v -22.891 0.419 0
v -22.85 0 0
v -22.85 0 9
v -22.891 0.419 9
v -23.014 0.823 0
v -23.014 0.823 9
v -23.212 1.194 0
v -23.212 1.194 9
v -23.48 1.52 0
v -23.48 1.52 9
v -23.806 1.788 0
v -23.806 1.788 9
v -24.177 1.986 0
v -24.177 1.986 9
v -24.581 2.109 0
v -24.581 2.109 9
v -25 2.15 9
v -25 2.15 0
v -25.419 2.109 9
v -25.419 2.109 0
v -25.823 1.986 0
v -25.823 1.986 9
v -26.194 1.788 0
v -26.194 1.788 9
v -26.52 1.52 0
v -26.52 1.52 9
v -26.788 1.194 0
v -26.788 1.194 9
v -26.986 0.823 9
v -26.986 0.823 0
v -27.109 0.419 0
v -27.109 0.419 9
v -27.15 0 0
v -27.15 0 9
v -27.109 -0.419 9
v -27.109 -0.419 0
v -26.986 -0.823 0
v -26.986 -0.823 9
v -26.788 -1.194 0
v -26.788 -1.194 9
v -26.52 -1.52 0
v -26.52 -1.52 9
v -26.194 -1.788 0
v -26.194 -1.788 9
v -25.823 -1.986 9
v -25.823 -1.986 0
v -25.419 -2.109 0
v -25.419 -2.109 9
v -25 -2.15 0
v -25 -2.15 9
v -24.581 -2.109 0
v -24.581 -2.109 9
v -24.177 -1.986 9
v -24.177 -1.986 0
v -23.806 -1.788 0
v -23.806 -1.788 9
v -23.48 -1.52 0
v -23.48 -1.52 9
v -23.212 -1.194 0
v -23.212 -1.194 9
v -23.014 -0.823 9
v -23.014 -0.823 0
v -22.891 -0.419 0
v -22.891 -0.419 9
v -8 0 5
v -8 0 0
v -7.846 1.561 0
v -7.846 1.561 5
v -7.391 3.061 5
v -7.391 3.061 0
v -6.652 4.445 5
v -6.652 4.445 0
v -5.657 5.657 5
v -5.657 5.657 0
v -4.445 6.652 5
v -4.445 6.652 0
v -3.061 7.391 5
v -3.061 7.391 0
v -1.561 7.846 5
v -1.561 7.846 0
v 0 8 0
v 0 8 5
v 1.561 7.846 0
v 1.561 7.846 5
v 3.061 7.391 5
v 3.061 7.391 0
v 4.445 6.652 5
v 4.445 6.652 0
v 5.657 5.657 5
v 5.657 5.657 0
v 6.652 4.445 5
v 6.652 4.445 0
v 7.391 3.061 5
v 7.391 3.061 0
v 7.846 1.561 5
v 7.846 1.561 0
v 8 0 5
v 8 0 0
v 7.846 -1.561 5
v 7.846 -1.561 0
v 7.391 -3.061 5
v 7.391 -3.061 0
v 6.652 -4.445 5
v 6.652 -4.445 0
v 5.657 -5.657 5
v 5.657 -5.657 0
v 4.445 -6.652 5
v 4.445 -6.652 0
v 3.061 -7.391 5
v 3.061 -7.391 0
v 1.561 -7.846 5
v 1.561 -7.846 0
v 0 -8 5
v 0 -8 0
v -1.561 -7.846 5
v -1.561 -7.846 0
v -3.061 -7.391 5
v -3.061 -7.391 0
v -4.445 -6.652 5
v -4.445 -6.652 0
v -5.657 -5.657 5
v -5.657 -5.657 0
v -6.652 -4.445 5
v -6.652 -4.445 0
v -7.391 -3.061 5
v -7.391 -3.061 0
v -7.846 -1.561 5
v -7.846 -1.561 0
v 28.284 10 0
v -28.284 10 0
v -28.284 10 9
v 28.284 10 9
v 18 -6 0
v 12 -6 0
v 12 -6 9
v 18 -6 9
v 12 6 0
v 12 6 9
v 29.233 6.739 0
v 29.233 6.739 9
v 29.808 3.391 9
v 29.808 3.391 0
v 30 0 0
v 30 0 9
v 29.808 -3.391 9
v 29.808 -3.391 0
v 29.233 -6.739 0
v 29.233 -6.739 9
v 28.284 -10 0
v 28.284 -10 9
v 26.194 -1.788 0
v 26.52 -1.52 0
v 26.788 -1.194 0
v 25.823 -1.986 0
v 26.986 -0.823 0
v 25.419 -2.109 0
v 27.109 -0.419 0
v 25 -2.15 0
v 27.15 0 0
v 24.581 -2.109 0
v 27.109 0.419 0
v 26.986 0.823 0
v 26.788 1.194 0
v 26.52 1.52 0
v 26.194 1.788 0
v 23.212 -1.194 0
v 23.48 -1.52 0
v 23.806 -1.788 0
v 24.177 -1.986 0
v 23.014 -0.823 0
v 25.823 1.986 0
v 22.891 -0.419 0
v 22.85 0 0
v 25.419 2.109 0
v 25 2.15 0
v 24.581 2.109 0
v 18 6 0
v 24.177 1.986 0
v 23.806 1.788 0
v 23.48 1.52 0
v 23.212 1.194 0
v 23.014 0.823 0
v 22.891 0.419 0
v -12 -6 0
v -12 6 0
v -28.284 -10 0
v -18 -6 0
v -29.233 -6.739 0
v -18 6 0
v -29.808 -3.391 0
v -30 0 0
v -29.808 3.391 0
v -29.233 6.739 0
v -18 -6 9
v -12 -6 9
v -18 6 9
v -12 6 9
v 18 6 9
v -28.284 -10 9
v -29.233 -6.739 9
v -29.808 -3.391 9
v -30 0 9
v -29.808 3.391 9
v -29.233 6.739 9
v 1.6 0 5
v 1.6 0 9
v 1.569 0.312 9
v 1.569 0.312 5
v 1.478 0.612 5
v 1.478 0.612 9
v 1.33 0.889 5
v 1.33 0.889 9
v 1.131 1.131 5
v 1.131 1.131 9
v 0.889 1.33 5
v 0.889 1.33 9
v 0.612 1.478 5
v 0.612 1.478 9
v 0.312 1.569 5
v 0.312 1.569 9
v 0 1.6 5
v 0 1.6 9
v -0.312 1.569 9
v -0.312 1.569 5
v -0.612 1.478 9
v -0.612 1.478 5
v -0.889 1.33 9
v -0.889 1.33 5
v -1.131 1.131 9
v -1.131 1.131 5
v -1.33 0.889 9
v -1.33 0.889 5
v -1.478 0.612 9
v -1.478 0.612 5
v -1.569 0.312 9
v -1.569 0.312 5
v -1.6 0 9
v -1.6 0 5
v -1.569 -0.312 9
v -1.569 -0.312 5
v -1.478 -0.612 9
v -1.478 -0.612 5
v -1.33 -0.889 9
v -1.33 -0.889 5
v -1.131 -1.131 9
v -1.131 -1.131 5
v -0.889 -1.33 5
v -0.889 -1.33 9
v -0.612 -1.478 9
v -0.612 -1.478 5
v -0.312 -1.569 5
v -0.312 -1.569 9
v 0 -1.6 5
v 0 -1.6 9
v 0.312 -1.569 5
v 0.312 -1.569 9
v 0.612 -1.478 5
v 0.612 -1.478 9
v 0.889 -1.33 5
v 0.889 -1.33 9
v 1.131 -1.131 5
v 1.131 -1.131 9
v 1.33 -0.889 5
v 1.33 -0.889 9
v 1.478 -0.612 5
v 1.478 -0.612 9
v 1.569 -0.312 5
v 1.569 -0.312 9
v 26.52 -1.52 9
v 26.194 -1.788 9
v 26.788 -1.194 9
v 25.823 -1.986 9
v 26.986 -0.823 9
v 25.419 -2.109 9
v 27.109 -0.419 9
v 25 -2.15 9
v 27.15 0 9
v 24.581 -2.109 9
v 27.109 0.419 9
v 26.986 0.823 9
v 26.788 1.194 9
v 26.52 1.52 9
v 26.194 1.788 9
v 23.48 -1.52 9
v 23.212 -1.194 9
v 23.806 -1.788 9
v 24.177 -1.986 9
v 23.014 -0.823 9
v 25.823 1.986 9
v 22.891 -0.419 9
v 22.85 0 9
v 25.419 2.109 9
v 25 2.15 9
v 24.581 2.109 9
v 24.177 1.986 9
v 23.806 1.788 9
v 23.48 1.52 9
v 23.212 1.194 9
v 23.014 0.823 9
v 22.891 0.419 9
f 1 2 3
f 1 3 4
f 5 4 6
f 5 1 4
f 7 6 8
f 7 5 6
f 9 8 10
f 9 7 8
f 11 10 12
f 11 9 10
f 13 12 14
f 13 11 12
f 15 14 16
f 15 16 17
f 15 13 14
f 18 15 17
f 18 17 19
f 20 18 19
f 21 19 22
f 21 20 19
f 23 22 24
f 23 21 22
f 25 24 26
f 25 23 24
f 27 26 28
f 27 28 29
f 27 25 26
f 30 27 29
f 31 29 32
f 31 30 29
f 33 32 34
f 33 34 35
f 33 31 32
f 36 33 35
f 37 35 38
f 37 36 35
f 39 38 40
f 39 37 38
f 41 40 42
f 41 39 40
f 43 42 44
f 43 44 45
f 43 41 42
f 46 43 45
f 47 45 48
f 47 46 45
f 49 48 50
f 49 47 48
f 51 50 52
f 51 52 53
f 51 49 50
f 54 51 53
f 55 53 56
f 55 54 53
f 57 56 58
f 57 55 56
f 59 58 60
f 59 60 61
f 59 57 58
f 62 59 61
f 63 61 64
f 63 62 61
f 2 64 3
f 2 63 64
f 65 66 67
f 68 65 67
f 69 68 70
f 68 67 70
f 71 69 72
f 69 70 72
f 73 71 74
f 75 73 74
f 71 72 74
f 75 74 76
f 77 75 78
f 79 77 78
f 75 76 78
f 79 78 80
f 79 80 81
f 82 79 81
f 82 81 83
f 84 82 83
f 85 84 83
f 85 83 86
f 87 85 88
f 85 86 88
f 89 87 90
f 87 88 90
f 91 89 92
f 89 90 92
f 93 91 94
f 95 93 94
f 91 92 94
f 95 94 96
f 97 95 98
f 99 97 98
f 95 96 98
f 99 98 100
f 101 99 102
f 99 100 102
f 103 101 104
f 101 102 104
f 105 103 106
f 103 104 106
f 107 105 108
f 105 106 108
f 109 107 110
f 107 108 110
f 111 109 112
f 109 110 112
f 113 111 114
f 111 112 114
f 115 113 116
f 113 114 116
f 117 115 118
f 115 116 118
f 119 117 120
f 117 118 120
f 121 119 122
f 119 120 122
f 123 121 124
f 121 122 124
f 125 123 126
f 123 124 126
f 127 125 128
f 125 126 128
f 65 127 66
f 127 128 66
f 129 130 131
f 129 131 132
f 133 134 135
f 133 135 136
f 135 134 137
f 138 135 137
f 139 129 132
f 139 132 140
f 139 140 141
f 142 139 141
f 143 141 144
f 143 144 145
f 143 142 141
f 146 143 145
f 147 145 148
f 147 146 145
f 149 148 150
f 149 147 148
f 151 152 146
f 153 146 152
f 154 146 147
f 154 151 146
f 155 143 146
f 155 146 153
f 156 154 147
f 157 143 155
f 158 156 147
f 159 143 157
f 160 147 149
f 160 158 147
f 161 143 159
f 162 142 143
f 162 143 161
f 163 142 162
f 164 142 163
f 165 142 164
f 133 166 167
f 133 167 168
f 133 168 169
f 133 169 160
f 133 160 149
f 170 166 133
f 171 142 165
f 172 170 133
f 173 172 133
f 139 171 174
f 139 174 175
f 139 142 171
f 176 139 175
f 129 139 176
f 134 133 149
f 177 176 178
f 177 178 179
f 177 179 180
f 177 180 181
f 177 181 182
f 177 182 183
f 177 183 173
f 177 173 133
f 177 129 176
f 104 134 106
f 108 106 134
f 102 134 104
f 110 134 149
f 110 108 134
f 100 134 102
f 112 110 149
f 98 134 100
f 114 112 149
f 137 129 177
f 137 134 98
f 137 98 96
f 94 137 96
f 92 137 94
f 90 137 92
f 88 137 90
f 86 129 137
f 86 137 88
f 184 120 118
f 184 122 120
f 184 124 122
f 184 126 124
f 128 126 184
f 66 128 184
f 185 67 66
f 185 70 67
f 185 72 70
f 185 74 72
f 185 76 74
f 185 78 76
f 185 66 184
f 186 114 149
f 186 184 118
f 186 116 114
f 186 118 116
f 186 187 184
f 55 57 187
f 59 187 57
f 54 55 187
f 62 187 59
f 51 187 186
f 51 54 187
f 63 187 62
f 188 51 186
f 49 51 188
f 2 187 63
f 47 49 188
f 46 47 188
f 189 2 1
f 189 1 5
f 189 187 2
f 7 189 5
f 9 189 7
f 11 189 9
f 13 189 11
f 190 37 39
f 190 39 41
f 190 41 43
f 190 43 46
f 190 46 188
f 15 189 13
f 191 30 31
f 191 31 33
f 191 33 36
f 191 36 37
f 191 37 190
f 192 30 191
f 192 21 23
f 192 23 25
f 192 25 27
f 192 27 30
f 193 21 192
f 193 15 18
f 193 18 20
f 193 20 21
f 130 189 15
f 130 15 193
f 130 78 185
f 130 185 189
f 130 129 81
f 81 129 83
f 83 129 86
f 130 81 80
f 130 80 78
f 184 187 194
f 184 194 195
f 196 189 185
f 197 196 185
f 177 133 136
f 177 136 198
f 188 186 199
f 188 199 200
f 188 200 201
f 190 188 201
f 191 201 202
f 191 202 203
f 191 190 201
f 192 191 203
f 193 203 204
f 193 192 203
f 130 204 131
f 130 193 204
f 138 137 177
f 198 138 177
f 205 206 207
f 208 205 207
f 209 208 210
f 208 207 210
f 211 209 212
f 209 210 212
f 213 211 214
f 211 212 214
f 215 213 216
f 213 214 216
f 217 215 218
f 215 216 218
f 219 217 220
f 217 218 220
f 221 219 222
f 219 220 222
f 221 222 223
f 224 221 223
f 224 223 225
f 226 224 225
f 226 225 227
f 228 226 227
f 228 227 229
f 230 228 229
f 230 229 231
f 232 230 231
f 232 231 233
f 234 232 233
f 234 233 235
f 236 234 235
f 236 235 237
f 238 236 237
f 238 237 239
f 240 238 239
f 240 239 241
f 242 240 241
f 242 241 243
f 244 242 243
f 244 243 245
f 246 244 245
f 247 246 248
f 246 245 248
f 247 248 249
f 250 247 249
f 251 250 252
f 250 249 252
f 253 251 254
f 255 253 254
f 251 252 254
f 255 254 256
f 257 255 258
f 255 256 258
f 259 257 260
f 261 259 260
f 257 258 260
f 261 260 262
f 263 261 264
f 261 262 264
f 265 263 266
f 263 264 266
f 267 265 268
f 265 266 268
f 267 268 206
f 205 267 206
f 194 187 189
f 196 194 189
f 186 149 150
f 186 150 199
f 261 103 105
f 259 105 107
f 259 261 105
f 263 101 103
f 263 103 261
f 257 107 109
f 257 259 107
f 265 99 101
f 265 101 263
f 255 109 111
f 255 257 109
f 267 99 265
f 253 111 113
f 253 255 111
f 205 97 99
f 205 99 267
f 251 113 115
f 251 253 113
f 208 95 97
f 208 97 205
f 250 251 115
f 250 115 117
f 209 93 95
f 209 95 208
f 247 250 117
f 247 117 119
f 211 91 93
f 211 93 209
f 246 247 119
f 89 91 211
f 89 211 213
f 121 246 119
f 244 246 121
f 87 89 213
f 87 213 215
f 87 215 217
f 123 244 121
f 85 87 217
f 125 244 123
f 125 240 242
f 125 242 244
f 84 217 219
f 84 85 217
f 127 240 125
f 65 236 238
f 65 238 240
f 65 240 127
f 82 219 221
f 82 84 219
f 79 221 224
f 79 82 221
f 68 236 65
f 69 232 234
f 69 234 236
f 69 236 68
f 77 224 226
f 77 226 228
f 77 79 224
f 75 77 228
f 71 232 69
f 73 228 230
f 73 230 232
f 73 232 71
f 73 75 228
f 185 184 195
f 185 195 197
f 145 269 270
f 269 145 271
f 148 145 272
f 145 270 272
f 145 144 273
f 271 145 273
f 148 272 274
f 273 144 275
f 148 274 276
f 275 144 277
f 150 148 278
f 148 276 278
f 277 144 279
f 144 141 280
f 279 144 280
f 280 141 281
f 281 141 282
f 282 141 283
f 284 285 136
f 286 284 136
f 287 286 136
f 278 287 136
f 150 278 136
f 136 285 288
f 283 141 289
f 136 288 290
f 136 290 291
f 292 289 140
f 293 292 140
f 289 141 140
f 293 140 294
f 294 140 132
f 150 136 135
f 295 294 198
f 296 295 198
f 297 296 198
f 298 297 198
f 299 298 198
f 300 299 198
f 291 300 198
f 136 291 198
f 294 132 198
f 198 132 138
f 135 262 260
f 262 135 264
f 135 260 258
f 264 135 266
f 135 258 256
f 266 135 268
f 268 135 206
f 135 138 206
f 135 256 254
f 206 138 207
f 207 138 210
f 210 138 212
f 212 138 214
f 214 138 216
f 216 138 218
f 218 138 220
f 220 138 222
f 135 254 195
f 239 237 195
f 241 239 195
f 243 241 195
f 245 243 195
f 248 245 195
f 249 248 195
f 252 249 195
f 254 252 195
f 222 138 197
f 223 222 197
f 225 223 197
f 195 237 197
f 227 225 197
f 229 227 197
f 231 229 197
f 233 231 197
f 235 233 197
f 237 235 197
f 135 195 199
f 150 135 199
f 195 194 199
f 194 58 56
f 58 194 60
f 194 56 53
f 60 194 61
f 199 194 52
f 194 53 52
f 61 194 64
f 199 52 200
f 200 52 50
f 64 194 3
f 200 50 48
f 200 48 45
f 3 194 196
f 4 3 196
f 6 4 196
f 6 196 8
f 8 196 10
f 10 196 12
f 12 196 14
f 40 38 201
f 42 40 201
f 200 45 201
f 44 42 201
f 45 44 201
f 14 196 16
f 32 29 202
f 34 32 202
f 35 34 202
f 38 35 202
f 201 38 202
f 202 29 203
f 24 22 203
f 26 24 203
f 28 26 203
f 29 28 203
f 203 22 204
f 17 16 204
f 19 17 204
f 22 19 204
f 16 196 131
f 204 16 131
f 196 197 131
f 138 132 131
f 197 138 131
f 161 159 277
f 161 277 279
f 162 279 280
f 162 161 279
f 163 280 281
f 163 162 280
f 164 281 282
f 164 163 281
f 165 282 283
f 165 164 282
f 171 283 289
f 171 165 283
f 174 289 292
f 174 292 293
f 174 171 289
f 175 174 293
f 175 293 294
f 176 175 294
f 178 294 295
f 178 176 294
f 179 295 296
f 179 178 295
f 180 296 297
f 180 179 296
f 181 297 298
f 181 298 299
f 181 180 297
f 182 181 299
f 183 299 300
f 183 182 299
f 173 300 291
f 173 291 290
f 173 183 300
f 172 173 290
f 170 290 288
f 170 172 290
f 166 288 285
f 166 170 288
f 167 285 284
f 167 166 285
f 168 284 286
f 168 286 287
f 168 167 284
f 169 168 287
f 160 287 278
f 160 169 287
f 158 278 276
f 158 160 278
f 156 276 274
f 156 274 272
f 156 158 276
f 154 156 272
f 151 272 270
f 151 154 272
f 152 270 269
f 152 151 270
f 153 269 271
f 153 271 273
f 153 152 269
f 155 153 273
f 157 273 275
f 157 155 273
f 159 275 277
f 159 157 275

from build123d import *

# Parameters (mm, degrees)
ESQUISSE1_R             = 2.15
ESQUISSE1_W             = 6
ESQUISSE1_H             = 12
BOSS_EXTRU_1_DEPTH      = 9
ESQUISSE2_R             = 8
ENL_V_MAT_EXTRU_1_DEPTH = 5
ESQUISSE3_R             = 1.6
ENL_V_MAT_EXTRU_2_DEPTH = 33.878564446


with BuildPart() as part:
    # Esquisse1 → Boss.-Extru.1 (new body)
    with BuildSketch(Plane.XY):
        with BuildLine():
            Line((0, -10), (-28.284271247, -10))
            ThreePointArc((-28.284271247, -10), (-30, 0), (-28.284271247, 10))
            Line((-28.284271247, 10), (0, 10))
            Line((0, 10), (28.284271247, 10))
            ThreePointArc((28.284271247, 10), (30, 0), (28.284271247, -10))
            Line((28.284271247, -10), (0, -10))
        make_face()
        with Locations((-25, 0)):
            Circle(ESQUISSE1_R, mode=Mode.SUBTRACT)
        with Locations((25, 0)):
            Circle(ESQUISSE1_R, mode=Mode.SUBTRACT)
        with Locations((-15, 0)):
            Rectangle(ESQUISSE1_W, ESQUISSE1_H, mode=Mode.SUBTRACT)
        with Locations((15, 0)):
            Rectangle(ESQUISSE1_W, ESQUISSE1_H, mode=Mode.SUBTRACT)
    extrude(amount=BOSS_EXTRU_1_DEPTH)

    # Esquisse2 → Enlèv. mat.-Extru.1 (cut)
    with BuildSketch(Plane(origin=(0, 0, 0), x_dir=(-1, 0, 0), z_dir=(0, 0, -1))):
        Circle(ESQUISSE2_R)
    extrude(amount=-ENL_V_MAT_EXTRU_1_DEPTH, mode=Mode.SUBTRACT)

    # Esquisse3 → Enlèv. mat.-Extru.2 (cut, through all)
    with BuildSketch(Plane.XY.offset(9)):
        Circle(ESQUISSE3_R)
    extrude(amount=-ENL_V_MAT_EXTRU_2_DEPTH, mode=Mode.SUBTRACT)


solid = part.part
